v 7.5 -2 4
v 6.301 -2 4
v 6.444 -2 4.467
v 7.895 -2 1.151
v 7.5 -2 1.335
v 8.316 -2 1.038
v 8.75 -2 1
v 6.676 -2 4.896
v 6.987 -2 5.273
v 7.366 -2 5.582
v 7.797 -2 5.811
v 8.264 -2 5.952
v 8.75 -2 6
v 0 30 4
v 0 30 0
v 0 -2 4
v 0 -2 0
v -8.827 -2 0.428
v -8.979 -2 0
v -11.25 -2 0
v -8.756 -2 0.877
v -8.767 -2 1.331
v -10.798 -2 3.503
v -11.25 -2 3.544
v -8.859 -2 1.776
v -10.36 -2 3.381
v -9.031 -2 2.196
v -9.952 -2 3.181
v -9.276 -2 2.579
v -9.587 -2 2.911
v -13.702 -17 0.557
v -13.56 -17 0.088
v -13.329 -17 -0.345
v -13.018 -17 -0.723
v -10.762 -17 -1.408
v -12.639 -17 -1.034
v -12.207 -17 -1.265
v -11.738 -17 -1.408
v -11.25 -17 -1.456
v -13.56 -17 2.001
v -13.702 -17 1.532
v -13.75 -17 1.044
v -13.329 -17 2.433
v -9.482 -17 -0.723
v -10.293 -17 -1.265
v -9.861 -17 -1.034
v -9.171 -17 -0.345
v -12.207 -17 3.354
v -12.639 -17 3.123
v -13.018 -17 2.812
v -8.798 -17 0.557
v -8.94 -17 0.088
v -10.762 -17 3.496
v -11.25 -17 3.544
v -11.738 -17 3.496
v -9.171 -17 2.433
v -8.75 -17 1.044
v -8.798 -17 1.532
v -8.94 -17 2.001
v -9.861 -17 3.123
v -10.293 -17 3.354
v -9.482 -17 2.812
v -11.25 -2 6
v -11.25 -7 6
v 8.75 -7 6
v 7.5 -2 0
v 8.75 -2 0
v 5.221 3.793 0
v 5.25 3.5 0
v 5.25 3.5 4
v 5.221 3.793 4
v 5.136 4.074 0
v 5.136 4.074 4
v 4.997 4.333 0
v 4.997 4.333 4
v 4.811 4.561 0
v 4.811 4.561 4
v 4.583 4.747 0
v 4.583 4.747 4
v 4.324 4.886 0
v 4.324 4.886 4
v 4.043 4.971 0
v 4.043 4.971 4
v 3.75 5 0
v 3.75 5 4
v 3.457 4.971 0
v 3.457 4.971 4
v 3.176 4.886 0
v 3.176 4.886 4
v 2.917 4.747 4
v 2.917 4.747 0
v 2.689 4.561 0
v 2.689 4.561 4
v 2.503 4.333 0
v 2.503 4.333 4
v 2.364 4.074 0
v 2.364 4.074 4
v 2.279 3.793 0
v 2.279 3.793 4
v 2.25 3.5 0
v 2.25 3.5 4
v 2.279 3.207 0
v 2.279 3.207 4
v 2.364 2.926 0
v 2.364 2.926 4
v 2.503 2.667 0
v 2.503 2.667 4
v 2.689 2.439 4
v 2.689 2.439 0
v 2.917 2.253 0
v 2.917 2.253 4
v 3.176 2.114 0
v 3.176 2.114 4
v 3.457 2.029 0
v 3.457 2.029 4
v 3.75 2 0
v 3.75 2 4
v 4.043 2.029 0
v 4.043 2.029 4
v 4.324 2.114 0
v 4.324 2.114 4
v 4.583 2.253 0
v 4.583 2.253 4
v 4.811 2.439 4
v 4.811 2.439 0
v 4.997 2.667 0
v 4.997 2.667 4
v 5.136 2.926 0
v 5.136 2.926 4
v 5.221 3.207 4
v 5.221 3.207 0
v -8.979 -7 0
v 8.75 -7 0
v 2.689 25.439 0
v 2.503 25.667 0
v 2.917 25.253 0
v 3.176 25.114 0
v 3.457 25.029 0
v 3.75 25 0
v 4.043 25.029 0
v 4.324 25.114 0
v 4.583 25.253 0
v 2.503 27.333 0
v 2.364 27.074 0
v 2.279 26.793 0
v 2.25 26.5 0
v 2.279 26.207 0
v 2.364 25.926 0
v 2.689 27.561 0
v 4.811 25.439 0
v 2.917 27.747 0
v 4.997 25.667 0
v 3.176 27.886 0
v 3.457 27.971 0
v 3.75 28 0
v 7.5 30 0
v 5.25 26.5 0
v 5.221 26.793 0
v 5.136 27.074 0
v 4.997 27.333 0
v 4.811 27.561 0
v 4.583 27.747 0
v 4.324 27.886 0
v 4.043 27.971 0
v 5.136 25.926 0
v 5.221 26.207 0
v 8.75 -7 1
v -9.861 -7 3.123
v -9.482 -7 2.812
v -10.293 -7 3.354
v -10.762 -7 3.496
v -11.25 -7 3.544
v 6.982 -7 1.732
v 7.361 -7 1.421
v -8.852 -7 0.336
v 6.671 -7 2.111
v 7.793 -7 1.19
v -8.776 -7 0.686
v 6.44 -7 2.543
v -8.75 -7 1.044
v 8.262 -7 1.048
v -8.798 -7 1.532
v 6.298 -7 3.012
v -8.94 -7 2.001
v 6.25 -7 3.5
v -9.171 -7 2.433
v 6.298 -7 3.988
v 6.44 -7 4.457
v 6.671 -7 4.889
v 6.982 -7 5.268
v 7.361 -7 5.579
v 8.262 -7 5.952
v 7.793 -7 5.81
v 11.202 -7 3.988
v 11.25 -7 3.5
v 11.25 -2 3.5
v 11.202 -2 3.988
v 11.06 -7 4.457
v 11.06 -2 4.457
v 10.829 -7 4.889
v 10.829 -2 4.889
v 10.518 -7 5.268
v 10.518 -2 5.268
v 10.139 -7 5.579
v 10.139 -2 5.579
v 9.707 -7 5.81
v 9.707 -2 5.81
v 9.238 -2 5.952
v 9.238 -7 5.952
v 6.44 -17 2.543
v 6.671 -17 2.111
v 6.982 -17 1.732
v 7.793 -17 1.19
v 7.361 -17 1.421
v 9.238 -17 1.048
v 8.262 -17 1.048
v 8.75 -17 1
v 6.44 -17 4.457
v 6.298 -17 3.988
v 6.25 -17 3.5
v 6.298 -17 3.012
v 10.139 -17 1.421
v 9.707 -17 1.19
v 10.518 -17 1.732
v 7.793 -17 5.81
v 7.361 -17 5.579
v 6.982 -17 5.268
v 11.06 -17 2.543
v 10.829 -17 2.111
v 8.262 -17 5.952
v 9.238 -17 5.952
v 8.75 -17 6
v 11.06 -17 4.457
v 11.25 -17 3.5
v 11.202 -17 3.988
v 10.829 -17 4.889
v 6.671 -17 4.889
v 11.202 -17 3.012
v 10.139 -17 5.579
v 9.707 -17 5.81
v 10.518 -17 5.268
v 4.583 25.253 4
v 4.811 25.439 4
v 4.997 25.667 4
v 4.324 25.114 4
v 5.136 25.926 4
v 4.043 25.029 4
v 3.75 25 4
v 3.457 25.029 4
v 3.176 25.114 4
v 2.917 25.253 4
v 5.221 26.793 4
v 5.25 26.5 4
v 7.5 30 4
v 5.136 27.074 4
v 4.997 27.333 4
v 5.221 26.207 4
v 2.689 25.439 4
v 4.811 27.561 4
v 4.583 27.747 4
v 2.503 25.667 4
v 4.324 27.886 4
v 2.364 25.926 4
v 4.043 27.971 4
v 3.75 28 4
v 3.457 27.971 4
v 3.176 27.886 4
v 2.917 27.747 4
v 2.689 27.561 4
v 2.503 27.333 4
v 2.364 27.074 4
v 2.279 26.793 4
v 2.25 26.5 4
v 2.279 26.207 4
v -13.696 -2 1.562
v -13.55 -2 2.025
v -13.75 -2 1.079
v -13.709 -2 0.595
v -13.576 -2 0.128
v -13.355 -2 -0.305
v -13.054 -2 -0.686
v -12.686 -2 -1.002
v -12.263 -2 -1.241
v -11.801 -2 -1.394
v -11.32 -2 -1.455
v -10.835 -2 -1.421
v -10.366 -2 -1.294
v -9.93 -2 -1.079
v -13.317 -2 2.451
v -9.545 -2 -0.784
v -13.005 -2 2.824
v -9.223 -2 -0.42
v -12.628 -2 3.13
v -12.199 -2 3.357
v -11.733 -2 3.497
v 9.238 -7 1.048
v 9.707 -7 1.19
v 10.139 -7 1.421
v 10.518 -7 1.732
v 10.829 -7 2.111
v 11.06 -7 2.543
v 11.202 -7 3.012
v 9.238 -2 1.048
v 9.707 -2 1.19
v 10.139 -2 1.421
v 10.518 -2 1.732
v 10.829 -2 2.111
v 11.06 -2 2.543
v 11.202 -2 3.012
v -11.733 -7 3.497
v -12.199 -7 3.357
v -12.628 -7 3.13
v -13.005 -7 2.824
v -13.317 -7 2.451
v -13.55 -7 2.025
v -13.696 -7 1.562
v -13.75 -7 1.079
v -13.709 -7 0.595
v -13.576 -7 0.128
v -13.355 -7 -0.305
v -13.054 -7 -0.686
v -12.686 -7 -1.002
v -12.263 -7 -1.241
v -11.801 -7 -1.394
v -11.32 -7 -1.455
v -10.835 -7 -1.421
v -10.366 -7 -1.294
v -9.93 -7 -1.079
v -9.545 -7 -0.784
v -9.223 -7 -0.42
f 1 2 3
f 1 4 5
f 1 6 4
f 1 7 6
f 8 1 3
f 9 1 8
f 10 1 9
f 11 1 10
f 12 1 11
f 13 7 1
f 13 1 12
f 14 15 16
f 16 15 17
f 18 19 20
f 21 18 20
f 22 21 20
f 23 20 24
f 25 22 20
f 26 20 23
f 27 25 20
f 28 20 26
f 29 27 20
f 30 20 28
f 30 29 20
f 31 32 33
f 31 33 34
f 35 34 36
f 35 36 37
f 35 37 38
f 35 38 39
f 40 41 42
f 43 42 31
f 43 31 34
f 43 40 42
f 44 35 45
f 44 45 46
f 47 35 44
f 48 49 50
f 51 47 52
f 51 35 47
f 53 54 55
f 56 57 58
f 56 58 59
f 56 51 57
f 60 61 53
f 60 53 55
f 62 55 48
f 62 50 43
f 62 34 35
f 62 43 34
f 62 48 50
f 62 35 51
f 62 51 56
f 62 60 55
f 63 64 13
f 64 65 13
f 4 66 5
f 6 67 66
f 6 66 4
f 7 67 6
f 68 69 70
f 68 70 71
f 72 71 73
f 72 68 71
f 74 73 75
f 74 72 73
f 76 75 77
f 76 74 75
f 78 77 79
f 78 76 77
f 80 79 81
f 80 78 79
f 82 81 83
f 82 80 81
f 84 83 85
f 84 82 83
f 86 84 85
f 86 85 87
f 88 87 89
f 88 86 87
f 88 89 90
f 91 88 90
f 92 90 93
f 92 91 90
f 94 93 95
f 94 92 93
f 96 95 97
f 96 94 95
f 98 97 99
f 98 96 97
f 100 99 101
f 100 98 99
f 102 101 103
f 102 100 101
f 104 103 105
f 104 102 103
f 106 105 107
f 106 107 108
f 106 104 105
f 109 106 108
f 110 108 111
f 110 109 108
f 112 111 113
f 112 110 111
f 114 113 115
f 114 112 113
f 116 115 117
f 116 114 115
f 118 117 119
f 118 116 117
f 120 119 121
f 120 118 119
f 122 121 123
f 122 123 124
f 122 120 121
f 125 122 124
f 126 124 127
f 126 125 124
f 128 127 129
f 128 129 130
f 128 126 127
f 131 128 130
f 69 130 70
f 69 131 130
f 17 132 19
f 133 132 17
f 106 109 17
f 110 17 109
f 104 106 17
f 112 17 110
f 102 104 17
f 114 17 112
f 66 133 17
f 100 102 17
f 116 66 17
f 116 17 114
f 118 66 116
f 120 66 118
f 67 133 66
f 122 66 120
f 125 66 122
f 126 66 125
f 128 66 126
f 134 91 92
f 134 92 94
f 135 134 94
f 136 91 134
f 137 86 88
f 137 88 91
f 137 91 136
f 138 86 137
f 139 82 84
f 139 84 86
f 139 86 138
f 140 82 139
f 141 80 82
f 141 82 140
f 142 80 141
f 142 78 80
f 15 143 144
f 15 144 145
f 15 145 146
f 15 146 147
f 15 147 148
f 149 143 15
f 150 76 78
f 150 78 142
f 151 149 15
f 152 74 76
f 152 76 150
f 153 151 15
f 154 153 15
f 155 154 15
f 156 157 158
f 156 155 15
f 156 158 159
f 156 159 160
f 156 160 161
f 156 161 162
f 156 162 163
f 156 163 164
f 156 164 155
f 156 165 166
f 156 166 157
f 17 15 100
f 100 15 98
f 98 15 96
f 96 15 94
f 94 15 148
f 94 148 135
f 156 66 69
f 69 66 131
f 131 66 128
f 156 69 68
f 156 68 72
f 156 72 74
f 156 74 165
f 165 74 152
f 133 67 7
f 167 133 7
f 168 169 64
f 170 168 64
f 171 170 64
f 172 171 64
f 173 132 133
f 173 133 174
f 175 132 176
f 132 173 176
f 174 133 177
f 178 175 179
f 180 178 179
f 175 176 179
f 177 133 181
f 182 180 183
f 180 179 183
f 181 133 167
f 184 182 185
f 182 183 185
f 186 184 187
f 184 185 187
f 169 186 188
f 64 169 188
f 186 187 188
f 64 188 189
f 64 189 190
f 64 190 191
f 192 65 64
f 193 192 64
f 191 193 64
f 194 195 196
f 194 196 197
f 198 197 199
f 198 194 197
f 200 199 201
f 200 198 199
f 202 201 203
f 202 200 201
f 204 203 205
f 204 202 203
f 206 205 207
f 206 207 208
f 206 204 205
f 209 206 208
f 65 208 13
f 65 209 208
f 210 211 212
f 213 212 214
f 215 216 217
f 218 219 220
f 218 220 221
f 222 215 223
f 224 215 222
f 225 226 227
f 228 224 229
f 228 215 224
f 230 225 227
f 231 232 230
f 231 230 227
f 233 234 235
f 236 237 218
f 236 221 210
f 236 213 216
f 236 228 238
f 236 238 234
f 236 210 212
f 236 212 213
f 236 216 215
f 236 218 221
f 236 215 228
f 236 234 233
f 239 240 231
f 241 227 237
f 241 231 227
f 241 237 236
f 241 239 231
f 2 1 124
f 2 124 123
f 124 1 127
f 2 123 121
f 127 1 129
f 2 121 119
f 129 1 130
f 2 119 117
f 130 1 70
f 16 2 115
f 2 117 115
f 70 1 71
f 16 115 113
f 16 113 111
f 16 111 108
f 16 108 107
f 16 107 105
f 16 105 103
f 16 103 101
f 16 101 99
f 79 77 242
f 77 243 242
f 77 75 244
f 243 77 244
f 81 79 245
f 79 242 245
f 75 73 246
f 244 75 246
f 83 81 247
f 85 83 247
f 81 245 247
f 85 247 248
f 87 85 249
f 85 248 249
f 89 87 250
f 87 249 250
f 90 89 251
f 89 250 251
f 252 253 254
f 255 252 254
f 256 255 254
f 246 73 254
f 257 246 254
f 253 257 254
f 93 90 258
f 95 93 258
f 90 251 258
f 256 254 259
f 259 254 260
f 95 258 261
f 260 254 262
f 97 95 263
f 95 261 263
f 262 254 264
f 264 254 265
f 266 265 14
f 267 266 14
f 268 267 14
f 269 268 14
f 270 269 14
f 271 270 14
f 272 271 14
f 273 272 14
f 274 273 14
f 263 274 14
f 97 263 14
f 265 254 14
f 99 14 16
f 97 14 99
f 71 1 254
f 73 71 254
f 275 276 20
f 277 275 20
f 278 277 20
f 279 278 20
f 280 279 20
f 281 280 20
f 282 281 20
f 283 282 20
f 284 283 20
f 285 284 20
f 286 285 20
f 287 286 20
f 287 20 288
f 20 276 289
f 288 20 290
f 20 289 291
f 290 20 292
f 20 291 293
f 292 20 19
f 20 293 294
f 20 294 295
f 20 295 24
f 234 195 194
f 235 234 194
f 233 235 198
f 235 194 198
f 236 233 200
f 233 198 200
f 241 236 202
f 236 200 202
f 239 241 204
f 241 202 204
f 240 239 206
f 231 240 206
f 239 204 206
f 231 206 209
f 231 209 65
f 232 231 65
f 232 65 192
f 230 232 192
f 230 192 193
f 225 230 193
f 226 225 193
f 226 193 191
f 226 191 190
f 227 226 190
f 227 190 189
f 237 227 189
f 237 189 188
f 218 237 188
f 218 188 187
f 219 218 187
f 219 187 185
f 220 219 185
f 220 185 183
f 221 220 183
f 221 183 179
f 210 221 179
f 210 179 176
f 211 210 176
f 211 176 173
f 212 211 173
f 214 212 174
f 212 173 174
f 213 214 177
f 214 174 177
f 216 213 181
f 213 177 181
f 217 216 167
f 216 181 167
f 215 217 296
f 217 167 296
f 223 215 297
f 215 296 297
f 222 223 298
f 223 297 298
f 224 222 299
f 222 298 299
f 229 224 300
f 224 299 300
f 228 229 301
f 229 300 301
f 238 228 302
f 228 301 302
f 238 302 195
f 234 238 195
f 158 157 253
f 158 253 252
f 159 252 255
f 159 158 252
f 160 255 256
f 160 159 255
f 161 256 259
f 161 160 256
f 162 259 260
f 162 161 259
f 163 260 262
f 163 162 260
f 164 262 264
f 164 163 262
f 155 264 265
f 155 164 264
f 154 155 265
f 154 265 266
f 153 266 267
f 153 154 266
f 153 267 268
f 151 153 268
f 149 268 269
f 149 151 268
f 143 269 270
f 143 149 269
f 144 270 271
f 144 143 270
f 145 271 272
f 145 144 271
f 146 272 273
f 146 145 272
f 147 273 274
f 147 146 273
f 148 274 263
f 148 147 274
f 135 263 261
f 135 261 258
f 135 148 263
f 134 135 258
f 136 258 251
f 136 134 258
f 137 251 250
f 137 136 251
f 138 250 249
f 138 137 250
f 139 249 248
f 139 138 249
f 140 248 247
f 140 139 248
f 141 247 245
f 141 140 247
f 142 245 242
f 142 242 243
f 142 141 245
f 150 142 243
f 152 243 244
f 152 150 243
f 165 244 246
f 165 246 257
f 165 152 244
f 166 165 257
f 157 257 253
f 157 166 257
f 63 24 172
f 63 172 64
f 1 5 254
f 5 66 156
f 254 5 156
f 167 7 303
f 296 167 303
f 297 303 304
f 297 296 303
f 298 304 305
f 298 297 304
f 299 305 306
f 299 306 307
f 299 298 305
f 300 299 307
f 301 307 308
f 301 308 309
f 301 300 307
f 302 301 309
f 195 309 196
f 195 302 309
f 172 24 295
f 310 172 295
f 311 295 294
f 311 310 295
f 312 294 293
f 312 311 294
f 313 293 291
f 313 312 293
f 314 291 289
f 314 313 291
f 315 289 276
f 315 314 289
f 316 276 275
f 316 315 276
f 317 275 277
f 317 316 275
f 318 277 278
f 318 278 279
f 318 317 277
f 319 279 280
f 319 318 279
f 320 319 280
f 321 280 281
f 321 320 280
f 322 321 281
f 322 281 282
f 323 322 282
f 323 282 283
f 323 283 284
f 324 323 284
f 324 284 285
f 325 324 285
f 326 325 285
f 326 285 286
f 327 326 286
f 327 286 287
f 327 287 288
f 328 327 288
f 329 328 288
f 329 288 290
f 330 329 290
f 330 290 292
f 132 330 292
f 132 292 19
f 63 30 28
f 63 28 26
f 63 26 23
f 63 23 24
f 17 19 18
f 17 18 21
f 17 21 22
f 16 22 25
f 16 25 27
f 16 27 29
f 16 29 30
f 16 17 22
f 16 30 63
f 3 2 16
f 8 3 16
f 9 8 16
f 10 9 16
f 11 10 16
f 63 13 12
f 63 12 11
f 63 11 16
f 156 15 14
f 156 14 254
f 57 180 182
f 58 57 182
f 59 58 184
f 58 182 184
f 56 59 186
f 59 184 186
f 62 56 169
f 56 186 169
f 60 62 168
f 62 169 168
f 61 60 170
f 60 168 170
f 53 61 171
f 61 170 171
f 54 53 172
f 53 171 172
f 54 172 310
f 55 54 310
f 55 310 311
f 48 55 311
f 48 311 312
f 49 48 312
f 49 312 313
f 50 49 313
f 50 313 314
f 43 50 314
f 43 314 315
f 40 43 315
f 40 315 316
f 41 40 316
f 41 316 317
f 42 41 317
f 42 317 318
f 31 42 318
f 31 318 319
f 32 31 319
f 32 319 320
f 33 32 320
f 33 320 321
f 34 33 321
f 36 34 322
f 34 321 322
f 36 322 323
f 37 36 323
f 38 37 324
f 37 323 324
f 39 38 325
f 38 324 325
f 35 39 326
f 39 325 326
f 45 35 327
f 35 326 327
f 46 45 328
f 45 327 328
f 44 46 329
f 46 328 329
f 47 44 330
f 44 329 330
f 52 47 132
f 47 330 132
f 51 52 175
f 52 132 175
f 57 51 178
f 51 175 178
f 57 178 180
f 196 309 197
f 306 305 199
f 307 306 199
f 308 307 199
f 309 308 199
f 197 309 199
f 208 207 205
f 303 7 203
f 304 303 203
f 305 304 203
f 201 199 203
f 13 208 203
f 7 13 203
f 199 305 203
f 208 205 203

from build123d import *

# Parameters (mm, degrees)
SKETCH1_R                = 1.5
BOSS_EXTRUDE1_DEPTH      = 4
SKETCH2_W                = 10
SKETCH2_H                = 6
BOSS_EXTRUDE2_DEPTH      = 5
SKETCH7_W                = 6
SKETCH7_H                = 5
BOSS_EXTRUDE5_DEPTH      = 10
SKETCH4_R                = 2.5
BOSS_EXTRUDE3_DEPTH      = 10
BOSS_EXTRUDE3_DEPTH_BACK = 5


with BuildPart() as part:
    # Sketch1 → Boss-Extrude1 (new body)
    with BuildSketch(Plane.XY):
        Polygon((0, 0), (0, 30), (7.5, 30), (7.5, 0), (7.5, -2), (0, -2), align=None)
        with Locations((3.75, 26.5)):
            Circle(SKETCH1_R, mode=Mode.SUBTRACT)
        with Locations((3.75, 3.5)):
            Circle(SKETCH1_R, mode=Mode.SUBTRACT)
    extrude(amount=BOSS_EXTRUDE1_DEPTH)

    # Sketch2 → Boss-Extrude2 (add)
    with BuildSketch(Plane.XZ.offset(2)):
        with Locations((3.75, 3)):
            Rectangle(SKETCH2_W, SKETCH2_H)
    extrude(amount=BOSS_EXTRUDE2_DEPTH)

    # Sketch7 → Boss-Extrude5 (add)
    with BuildSketch(Plane.ZY.offset(1.25)):
        with Locations((3, -4.5)):
            Rectangle(SKETCH7_W, SKETCH7_H)
    extrude(amount=BOSS_EXTRUDE5_DEPTH)

    # Sketch4 → Boss-Extrude3 (add, two sides)
    with BuildSketch(Plane.XZ.offset(7)) as boss_extrude3_sk:
        with Locations((8.75, 3.5)):
            Circle(SKETCH4_R)
        with Locations((-11.25, 1.044308782)):
            Circle(SKETCH4_R)
    extrude(amount=BOSS_EXTRUDE3_DEPTH)
    extrude(boss_extrude3_sk.sketch, amount=-BOSS_EXTRUDE3_DEPTH_BACK)


solid = part.part
